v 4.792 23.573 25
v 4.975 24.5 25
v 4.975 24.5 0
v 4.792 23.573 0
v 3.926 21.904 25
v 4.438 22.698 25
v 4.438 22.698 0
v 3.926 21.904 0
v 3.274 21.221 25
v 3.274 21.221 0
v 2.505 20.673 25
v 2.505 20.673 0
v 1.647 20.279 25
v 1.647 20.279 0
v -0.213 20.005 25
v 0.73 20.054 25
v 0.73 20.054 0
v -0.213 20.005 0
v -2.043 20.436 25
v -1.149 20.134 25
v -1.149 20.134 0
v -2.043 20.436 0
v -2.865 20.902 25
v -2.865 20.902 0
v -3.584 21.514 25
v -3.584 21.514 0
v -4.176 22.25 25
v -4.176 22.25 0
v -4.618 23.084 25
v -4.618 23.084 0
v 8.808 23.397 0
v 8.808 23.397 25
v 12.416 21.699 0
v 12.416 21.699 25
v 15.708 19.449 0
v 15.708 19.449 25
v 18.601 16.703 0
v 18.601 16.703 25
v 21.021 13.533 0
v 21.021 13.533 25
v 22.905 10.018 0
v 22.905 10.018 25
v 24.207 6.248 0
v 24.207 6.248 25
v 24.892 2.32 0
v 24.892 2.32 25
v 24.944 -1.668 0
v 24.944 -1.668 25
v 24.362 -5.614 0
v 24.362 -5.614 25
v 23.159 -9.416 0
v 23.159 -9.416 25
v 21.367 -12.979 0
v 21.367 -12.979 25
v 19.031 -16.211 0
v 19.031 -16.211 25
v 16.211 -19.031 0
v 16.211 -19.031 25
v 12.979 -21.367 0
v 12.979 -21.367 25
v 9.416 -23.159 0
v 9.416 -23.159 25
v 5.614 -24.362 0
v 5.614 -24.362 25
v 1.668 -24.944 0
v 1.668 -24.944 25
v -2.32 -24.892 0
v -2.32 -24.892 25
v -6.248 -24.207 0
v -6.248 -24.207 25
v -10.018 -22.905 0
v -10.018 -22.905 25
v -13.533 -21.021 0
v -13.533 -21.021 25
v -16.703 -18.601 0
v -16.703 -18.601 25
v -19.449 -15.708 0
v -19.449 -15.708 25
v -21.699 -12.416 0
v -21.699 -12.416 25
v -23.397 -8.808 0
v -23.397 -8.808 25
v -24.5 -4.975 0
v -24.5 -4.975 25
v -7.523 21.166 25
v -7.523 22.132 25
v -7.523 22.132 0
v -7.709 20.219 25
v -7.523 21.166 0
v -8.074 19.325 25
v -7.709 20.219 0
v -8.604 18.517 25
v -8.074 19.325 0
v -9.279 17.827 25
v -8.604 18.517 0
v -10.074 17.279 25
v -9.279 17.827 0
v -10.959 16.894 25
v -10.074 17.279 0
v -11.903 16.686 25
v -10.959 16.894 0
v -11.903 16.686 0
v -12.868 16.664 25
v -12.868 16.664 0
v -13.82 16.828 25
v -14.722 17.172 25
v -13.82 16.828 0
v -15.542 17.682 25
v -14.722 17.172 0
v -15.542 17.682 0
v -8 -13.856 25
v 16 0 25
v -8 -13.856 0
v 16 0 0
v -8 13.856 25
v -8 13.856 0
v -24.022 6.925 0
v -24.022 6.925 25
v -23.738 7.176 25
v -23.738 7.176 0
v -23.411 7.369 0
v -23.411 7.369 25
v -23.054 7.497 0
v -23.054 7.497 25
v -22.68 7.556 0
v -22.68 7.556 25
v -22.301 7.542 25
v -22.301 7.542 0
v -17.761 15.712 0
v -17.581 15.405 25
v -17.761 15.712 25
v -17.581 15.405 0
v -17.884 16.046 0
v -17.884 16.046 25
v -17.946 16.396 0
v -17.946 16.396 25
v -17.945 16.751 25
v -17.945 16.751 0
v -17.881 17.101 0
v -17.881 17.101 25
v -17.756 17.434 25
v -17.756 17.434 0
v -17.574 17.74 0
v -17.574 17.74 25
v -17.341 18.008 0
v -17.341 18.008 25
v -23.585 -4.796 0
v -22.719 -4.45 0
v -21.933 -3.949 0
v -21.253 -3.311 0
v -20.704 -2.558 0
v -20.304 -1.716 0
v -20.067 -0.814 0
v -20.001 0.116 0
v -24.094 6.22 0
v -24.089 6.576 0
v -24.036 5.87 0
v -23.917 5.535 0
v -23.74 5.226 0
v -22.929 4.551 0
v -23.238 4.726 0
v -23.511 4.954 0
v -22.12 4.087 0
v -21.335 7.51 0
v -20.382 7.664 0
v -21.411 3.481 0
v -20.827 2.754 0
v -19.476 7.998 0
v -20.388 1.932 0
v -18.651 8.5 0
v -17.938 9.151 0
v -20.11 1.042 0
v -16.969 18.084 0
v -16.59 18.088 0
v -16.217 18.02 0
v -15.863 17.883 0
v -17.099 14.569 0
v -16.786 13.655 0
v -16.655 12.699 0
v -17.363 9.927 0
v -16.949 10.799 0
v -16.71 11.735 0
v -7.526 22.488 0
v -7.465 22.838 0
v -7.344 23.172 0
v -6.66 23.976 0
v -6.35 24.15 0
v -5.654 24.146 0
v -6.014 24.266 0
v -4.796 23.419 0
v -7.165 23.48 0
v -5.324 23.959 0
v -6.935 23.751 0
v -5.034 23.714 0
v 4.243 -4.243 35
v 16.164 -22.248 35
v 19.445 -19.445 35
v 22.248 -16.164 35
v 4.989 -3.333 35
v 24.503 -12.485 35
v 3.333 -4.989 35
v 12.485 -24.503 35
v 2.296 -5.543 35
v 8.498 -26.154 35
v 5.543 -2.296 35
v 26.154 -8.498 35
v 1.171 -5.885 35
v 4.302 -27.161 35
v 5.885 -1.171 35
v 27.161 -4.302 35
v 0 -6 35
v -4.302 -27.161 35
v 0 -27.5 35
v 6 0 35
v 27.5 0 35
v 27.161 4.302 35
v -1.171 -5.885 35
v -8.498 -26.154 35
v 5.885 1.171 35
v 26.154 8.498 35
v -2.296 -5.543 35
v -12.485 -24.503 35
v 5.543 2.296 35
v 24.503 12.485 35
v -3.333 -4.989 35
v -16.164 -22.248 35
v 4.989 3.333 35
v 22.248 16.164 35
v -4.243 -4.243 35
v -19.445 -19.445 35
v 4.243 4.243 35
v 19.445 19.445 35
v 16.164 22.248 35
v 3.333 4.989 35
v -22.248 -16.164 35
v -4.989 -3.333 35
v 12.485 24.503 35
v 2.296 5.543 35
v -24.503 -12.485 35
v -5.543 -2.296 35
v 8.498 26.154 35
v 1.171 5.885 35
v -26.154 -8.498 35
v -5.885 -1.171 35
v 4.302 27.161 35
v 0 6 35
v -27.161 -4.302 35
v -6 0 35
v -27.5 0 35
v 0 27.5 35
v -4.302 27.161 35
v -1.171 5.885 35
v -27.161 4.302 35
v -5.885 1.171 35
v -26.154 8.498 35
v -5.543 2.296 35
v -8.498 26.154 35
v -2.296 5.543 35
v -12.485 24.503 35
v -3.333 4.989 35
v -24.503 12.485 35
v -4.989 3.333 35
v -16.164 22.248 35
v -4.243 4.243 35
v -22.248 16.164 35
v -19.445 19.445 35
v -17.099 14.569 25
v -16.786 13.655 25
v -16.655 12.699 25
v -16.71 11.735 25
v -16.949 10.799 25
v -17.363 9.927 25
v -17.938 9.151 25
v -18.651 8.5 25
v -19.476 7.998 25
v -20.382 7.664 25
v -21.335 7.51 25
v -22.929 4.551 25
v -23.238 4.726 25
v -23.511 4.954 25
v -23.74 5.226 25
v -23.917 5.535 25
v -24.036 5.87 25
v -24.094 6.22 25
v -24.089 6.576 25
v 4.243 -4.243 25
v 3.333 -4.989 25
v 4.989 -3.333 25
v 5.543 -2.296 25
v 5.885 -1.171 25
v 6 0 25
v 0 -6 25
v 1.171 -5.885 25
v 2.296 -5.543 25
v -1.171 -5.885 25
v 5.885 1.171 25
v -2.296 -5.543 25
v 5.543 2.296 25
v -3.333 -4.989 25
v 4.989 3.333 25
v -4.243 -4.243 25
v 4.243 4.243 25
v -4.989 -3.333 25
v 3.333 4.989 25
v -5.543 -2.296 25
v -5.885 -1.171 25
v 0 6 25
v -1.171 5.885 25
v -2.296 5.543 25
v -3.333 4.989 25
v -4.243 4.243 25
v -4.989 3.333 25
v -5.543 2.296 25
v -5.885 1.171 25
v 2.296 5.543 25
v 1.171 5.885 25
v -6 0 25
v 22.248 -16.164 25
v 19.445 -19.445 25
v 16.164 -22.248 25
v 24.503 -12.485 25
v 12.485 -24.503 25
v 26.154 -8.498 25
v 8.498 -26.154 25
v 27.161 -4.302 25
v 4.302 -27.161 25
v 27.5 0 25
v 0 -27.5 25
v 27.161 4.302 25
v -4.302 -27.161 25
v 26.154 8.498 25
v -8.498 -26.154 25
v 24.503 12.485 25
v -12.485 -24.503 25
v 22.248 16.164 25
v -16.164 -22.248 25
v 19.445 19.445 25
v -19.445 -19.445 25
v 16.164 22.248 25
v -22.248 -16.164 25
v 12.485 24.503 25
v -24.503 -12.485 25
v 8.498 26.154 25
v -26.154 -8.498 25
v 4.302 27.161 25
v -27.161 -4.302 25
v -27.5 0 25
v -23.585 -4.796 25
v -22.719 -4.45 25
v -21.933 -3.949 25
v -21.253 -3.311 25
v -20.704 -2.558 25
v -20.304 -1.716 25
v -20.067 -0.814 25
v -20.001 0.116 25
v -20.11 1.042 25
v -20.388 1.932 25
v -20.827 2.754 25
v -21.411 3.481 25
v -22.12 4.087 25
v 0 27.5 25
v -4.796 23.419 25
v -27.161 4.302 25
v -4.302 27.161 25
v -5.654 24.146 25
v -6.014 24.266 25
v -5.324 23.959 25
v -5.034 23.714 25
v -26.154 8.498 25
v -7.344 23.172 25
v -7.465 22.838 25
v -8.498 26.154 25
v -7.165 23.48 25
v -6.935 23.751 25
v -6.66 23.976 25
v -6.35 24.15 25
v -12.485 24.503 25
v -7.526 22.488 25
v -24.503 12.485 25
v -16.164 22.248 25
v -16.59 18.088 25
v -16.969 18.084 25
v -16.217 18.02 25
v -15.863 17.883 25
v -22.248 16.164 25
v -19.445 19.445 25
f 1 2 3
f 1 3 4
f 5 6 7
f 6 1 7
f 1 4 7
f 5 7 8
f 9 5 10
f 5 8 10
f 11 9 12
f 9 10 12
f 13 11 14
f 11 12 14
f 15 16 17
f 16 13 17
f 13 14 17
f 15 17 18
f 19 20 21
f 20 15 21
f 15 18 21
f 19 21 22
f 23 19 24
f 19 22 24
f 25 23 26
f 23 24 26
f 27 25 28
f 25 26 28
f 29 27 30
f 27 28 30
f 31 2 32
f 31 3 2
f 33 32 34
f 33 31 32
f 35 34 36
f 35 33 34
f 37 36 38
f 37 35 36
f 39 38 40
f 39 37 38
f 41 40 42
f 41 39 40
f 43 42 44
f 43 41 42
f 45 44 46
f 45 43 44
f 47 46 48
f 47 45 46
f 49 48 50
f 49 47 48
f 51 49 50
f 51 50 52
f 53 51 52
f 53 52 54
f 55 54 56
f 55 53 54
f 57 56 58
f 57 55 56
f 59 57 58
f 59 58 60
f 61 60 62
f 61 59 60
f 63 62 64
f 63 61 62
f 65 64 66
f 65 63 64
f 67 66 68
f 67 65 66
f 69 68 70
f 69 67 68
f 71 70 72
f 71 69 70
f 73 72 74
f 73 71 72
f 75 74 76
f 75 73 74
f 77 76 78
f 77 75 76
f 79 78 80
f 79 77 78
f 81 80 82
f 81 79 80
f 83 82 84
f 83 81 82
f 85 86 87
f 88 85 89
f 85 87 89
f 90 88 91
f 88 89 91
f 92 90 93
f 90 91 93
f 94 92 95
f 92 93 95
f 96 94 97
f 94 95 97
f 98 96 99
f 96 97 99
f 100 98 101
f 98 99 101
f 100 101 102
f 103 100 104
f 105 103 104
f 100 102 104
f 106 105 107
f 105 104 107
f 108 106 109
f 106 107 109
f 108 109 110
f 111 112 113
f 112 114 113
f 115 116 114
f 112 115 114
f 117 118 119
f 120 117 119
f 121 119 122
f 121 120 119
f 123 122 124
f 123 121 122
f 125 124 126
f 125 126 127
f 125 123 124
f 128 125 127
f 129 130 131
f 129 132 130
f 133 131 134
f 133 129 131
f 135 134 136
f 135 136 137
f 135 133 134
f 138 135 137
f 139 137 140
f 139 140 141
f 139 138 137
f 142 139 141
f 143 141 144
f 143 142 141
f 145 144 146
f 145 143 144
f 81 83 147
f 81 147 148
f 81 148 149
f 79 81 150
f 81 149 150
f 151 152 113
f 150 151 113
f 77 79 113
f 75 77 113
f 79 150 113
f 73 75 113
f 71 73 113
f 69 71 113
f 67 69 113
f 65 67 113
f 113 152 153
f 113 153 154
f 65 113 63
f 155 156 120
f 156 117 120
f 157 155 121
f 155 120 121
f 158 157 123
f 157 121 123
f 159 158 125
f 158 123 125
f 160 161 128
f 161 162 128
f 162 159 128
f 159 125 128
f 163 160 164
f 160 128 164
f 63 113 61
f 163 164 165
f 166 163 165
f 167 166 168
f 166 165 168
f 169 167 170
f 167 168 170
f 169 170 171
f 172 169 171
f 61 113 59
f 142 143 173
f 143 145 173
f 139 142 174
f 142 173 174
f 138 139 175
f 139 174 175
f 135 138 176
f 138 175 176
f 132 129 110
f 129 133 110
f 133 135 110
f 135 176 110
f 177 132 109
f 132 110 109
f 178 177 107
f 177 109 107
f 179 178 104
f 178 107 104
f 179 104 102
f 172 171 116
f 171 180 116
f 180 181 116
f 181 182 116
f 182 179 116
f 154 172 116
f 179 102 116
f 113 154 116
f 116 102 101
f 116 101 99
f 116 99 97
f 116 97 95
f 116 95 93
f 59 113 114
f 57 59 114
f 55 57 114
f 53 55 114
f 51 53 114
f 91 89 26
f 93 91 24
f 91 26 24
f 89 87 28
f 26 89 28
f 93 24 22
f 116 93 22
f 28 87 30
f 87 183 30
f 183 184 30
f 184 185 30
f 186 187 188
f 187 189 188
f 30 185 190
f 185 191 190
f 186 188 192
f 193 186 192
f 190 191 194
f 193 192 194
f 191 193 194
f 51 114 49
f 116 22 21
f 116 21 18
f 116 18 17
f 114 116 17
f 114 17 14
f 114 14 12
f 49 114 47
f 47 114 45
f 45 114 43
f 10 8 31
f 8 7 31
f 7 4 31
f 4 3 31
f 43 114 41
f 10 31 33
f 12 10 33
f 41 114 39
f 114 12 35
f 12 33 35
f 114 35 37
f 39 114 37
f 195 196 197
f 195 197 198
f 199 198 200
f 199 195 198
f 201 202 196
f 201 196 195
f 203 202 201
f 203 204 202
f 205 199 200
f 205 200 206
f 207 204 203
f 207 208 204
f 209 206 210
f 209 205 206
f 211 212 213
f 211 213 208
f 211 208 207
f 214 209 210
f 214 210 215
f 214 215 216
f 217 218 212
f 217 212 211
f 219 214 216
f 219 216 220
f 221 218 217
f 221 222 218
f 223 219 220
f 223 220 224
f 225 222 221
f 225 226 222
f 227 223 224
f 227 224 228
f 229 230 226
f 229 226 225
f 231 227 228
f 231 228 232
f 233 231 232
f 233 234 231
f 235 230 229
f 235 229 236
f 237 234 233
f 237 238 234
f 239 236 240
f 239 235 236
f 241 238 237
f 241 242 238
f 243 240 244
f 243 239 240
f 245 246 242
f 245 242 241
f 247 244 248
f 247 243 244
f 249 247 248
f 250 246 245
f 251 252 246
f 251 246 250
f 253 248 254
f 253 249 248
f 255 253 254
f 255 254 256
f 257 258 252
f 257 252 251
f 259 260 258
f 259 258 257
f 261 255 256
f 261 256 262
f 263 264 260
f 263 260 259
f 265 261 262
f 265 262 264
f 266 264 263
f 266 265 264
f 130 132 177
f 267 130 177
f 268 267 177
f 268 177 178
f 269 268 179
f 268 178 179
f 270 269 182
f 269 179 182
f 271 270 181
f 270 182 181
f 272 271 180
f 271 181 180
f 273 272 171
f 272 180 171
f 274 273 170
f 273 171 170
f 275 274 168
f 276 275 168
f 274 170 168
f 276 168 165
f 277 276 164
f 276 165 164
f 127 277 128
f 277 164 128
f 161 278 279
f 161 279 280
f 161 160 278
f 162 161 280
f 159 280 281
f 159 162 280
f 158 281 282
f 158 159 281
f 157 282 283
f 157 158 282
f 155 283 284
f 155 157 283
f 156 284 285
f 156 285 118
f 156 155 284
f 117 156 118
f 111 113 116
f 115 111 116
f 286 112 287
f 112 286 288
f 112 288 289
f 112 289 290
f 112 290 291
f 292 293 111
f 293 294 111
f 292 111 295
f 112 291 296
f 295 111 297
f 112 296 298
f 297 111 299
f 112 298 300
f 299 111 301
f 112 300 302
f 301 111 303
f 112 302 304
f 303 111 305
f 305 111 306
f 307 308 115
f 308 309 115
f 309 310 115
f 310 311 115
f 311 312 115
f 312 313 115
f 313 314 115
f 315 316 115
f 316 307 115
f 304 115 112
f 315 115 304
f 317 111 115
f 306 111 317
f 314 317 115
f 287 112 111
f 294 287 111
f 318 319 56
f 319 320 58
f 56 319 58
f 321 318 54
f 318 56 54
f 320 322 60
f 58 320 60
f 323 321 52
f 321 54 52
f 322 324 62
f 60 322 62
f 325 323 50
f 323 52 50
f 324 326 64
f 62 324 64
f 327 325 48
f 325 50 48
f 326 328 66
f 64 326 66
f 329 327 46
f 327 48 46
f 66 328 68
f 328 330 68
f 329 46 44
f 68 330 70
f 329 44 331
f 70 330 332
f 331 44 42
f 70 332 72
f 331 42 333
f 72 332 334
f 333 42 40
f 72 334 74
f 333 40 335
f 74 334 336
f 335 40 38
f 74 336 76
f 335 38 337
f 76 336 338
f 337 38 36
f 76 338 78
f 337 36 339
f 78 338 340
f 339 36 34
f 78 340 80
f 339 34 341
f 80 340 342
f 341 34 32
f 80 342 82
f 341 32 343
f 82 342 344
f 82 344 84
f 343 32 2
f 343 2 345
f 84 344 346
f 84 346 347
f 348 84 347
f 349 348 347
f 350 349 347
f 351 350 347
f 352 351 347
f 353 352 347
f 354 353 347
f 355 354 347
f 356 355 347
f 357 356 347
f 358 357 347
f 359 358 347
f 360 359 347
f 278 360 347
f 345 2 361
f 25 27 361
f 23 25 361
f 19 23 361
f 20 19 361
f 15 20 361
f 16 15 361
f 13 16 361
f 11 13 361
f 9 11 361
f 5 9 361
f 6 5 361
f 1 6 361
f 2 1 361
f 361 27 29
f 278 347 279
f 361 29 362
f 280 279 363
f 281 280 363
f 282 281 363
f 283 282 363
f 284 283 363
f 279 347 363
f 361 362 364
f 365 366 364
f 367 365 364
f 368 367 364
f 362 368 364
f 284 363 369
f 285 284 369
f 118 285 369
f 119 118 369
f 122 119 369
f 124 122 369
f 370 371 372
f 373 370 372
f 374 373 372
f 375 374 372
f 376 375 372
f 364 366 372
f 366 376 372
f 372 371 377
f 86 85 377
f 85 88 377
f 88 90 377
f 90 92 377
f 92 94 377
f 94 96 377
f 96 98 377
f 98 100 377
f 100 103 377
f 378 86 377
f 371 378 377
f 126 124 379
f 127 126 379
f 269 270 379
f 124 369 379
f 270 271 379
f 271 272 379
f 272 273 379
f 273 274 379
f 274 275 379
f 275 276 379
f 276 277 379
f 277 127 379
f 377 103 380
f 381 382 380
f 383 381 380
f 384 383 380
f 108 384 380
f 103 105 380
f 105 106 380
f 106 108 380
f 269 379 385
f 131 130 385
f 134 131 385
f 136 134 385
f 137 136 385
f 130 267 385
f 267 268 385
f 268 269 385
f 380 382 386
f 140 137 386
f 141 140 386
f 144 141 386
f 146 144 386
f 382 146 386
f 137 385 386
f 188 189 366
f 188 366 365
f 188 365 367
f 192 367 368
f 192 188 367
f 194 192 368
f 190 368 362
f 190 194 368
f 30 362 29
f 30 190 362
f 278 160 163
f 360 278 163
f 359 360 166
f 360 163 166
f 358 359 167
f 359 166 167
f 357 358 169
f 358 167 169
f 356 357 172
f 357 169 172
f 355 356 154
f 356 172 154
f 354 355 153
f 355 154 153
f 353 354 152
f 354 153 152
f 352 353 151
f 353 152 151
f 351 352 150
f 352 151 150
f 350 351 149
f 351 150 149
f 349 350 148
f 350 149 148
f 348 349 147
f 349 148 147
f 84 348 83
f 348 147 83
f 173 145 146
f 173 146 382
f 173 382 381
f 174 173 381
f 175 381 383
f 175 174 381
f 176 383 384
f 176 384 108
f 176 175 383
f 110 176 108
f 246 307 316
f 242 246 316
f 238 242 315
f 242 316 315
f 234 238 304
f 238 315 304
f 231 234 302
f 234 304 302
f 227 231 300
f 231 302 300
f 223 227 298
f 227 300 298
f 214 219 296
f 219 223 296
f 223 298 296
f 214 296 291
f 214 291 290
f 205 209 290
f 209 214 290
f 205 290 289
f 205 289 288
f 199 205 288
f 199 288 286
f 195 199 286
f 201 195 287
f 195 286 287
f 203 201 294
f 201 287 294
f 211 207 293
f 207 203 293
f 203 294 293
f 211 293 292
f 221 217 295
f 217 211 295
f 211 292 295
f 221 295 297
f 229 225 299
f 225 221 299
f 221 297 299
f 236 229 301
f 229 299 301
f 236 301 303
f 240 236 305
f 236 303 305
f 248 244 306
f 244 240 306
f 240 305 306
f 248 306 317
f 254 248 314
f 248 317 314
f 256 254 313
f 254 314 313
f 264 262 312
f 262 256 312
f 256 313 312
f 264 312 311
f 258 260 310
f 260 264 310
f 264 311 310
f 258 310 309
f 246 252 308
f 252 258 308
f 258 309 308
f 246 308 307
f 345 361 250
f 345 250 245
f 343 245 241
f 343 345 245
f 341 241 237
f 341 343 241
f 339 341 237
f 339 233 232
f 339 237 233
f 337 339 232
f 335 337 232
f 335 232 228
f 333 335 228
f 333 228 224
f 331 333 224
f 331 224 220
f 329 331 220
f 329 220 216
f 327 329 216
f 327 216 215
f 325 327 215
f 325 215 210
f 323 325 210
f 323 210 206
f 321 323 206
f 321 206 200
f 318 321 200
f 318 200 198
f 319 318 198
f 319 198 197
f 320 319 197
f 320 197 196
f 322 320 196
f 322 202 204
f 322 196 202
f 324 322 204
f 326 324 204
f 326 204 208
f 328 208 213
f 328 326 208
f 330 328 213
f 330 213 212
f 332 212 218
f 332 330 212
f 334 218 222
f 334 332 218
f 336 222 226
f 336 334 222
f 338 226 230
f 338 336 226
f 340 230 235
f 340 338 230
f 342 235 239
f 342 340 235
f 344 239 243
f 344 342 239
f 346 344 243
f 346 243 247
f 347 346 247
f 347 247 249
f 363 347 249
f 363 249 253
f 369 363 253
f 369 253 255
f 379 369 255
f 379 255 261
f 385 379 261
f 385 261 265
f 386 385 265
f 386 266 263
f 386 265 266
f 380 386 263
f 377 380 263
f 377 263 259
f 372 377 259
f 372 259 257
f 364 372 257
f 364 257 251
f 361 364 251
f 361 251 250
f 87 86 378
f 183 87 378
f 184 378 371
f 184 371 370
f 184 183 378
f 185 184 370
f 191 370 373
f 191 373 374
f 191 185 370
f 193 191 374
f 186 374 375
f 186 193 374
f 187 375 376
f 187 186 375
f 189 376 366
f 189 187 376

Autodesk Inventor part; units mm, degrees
ref_plane "YZ Plane" through (0, 0, 0) normal (1, 0, 0) x (0, 1, 0)
ref_plane "XZ Plane" through (0, 0, 0) normal (0, 1, 0) x (-1, 0, 0)
sketch "Sketch1" plane through (0, 0, 0) normal (0, 0, 1) x (1, 0, 0)
  circle A0 centre (0, 0) radius 27.5 projected
  circle A1 centre (0, 0) radius 35
  line L0 (16, 0) -> (-8, -13.8564)
  line L1 (-8, 13.8564) -> (16, 0)
  line L2 (-8, -13.8564) -> (-8, 13.8564)
  circle A2 centre (0, 0) radius 25
  circle A3 centre (-25, 0) radius 5
  circle A4 centre (-21.6506, 12.5) radius 5
  circle A5 centre (-12.5, 21.6506) radius 5
  circle A6 centre (0, 25) radius 5
  circle A7 centre (0, 0) radius 38 projected
  point P0 (4.9749, 24.5)
  point P1 (-4.9749, 24.5)
  point P2 (-7.9416, 23.7051)
  point P3 (-16.5584, 18.7302)
  point P4 (-18.7302, 16.5584)
  point P5 (-23.7051, 7.9416)
  point P6 (-24.5, 4.9749)
  point P7 (-24.5, -4.9749)
  dimension "d5" = 70
  dimension "d14" = 10
  dimension "d15" = 10
  dimension "d18" = 90
ref_plane "Work Plane7" through (-38, -38, 25) normal (0, 0, -1) x (0, 1, 0)
extrude "Extrusion1" add sketch "Sketch1" along normal up to surface (25 mm away) contours A3 A2 A4 A5 A6
fillet "Fillet1" radius 2 6 edges at (-24.5, 4.9749, 12.5) (-23.7051, 7.9416, 12.5) (-18.7302, 16.5584, 12.5) (-16.5584, 18.7302, 12.5) (-7.9416, 23.7051, 12.5) (-4.9749, 24.5, 12.5)
sketch "Sketch3" plane through (0, 0, 25) normal (0, 0, 1) x (0, 1, 0)
  circle A0 centre (0, 0) radius 28 projected
  circle A1 centre (0, 0) radius 6
  circle A2 centre (0, 0) radius 27.5
  dimension "d13" = 0.5
extrude "Extrusion3" add sketch "Sketch3" along normal blind 10 contours A2
properties part number "handle_base2"
